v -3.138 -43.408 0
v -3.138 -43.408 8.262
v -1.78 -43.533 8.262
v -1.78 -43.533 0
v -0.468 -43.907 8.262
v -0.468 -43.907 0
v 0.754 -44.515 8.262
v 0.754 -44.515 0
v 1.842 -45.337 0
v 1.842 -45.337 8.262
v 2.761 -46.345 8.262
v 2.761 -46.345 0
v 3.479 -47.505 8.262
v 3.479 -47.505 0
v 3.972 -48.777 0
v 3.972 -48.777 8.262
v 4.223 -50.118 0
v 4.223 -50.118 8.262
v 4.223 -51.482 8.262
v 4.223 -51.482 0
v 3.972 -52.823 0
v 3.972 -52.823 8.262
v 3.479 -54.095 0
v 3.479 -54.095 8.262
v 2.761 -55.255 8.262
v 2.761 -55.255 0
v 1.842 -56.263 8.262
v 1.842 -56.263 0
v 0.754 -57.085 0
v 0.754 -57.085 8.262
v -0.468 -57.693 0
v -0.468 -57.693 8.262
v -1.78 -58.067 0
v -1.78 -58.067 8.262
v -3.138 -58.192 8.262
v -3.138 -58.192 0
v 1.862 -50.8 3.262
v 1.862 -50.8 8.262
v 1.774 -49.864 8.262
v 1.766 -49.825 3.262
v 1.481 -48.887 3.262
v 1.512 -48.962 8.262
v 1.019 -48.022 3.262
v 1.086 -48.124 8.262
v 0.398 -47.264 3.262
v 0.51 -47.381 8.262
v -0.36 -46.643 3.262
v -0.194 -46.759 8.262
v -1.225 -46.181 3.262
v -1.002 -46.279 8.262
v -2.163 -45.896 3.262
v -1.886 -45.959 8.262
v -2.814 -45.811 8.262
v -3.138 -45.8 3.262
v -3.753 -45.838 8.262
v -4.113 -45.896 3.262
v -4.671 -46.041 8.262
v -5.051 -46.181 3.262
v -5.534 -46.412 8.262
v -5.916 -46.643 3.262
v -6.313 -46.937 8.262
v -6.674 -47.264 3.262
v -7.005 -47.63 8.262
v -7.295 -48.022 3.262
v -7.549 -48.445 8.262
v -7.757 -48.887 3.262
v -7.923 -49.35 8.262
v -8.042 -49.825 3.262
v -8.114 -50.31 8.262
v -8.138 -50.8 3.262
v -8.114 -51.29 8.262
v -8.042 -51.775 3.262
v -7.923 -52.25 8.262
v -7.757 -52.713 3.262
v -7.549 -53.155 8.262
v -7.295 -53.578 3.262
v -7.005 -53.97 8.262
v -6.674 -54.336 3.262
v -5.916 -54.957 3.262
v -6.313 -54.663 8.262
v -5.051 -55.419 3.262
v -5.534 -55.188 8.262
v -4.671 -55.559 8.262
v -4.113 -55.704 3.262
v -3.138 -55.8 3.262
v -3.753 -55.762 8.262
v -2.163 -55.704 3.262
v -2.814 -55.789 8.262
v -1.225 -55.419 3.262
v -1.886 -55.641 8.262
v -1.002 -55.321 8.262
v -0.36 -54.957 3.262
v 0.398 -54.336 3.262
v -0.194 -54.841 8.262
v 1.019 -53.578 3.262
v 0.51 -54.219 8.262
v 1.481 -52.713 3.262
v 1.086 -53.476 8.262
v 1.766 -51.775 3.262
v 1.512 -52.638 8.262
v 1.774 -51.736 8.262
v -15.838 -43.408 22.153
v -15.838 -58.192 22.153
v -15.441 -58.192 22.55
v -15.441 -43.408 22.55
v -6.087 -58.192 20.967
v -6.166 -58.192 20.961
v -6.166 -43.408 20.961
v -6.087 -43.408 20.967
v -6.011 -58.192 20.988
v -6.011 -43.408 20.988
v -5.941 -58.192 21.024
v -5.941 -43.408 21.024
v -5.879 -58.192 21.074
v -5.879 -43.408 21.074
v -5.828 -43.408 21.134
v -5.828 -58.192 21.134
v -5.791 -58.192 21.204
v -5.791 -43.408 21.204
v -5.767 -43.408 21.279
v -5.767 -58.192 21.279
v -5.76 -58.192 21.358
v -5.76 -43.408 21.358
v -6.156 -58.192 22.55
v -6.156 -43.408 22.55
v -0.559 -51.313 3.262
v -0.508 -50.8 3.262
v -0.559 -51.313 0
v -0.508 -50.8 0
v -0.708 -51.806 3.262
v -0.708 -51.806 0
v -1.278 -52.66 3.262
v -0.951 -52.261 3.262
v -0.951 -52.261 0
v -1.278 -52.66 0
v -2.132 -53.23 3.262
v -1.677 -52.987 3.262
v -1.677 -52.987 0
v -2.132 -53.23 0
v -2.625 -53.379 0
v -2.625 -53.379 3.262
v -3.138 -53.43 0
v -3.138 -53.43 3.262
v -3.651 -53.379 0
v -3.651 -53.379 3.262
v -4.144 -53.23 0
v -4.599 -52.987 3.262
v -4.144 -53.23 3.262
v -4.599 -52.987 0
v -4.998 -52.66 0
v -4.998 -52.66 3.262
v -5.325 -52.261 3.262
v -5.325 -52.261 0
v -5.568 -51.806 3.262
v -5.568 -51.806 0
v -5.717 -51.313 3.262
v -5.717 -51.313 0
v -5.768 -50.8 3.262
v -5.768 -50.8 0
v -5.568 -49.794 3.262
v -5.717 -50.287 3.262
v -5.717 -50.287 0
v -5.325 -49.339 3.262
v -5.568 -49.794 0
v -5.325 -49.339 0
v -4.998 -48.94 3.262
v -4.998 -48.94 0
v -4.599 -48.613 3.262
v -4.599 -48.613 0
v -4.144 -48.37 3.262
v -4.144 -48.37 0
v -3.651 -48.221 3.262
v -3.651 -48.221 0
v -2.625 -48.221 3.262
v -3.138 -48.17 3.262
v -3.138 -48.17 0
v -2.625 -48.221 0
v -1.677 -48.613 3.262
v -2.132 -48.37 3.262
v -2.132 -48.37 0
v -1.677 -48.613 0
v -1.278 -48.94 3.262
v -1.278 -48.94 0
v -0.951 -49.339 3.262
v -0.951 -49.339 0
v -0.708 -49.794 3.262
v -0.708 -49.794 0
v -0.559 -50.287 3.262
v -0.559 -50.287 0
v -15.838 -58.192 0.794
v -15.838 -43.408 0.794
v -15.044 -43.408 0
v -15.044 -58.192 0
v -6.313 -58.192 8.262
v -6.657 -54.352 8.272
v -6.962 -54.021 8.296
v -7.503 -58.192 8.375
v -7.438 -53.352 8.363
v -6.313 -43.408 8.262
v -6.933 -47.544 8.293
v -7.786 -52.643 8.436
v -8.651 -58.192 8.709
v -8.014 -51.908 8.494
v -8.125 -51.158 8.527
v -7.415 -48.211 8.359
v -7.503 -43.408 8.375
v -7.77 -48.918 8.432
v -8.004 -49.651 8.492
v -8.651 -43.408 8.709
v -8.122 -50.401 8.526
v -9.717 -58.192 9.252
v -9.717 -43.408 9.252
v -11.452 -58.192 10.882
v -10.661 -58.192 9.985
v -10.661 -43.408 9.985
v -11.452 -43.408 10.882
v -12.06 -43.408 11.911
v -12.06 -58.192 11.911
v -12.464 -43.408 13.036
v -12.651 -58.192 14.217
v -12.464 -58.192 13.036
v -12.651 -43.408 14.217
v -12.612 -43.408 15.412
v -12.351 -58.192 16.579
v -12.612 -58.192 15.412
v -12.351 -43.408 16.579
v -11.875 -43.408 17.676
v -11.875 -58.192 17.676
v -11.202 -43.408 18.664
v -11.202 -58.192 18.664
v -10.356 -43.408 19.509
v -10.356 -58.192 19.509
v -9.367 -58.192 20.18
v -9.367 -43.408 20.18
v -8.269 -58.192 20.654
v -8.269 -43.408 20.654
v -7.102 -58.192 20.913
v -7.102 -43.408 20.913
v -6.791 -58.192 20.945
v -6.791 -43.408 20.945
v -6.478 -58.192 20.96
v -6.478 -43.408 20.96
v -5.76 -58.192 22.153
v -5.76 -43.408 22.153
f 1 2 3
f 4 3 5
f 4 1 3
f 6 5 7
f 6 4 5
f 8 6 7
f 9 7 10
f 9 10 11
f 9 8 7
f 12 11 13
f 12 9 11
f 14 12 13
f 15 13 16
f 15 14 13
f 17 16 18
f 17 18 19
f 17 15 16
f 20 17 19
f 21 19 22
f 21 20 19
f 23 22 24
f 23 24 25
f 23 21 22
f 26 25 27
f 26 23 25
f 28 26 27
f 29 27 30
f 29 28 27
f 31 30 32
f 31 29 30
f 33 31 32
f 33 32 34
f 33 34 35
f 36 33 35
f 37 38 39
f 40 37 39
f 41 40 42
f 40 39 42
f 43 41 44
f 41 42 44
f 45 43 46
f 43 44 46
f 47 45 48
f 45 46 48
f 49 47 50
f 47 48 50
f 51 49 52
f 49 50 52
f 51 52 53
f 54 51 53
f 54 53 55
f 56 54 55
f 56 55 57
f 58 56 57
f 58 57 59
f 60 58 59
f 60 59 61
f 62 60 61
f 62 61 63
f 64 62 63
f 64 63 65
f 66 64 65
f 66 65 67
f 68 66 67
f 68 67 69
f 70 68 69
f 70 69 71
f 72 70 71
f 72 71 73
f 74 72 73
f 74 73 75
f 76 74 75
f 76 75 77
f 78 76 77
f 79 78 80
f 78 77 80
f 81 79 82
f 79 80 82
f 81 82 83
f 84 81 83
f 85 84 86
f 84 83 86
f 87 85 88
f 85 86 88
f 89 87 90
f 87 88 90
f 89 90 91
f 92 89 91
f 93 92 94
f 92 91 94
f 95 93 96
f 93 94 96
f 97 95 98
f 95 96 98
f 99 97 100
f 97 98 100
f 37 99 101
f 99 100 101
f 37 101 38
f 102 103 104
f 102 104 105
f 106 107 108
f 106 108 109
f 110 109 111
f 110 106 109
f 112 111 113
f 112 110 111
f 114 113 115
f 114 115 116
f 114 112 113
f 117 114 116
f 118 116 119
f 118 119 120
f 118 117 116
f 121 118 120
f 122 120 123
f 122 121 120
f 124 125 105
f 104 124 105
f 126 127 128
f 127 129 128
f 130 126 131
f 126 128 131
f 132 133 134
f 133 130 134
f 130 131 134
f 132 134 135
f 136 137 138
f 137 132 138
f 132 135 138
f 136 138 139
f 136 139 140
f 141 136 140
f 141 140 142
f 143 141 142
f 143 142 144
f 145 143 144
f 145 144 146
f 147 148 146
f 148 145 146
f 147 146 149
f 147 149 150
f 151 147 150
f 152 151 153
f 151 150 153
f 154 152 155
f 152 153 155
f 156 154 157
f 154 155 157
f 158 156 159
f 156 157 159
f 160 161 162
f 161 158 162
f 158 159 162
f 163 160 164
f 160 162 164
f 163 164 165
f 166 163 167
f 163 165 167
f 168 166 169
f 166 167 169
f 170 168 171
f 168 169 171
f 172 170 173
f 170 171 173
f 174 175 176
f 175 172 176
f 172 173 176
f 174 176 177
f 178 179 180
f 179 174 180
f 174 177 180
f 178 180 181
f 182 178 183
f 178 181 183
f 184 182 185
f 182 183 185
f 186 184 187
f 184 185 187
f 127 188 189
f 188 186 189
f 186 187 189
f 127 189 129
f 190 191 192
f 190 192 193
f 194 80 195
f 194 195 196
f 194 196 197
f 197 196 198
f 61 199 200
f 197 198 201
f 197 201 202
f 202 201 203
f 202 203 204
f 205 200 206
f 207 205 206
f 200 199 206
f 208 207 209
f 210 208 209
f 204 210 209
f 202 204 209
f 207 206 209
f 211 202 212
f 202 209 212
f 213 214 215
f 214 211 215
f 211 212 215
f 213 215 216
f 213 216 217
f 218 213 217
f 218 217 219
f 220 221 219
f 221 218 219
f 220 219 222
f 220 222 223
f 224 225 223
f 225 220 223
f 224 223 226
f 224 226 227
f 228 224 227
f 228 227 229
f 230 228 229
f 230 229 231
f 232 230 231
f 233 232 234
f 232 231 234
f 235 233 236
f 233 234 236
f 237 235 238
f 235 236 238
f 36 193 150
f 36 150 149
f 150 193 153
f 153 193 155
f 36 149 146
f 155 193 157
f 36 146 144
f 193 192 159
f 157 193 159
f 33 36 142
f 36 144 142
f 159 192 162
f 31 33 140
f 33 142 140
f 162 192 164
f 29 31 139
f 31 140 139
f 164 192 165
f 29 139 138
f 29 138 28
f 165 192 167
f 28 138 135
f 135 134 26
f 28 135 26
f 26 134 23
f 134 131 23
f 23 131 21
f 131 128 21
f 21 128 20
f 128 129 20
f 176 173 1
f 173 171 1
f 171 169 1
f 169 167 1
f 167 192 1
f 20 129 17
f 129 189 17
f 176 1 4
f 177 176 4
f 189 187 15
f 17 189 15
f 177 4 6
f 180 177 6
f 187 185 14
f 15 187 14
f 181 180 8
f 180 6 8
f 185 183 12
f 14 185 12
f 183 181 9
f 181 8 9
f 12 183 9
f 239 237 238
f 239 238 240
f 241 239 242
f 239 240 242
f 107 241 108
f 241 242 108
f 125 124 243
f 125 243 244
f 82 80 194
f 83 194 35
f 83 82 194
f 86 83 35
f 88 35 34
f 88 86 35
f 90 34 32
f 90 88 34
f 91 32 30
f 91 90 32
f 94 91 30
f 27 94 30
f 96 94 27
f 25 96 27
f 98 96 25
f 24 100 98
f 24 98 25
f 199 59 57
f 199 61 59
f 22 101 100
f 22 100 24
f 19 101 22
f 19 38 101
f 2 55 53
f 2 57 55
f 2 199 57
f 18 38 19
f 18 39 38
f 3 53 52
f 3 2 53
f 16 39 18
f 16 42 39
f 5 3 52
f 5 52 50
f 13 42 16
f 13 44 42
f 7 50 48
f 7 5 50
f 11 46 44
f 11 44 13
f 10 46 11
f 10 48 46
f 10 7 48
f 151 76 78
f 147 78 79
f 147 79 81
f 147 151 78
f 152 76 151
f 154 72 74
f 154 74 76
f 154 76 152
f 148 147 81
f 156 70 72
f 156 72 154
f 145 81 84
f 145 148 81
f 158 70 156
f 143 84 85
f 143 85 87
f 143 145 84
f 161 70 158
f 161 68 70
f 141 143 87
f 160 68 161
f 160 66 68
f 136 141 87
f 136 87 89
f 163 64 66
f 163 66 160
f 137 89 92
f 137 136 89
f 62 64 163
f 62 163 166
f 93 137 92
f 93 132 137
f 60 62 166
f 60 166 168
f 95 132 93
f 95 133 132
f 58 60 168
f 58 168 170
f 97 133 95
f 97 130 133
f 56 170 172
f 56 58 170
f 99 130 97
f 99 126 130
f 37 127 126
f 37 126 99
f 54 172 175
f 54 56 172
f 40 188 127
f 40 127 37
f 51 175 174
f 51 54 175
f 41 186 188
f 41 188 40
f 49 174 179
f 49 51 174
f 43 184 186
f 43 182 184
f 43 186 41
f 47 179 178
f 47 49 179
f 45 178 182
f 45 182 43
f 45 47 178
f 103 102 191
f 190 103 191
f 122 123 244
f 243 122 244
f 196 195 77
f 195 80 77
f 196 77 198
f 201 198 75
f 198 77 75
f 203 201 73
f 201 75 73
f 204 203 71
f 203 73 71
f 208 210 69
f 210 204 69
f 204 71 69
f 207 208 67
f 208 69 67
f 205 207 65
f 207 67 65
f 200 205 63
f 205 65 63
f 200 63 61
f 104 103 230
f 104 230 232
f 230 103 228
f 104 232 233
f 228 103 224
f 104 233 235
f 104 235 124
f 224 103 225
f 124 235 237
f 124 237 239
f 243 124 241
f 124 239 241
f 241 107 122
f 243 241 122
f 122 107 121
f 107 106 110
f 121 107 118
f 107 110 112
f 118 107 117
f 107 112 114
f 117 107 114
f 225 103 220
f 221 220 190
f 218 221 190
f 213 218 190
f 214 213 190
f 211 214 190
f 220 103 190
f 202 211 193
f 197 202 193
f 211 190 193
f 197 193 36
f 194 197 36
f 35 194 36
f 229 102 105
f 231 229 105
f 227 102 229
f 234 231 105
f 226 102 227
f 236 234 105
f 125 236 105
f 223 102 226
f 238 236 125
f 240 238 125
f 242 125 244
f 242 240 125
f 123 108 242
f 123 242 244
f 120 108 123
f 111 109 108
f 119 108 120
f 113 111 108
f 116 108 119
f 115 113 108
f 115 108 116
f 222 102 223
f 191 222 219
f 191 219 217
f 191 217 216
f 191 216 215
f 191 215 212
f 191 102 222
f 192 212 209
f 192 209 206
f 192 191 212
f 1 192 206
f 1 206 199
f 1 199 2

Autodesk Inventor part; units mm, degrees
ref_plane "YZ Plane" through (0, 0, 0) normal (1, 0, 0) x (0, 1, 0)
ref_plane "XZ Plane" through (0, 0, 0) normal (0, 1, 0) x (-1, 0, 0)
ref_plane "Work Plane1" through (0, 0, 0) normal (0, 0, 1) x (1, 0, 0)
sketch "Sketch1" plane through (0, 0, 0) normal (0, 0, 1) x (1, 0, 0)
  line L0 (-0.508, 0) -> (-0.508, -400) projected
  line L1 (-5.768, 0) -> (-5.768, -400) projected
  circle A0 centre (-3.138, -50.8) radius 2.63
  line L2 (-13.138, 0) -> (-13.138, -400) projected
  circle A1 centre (-3.138, -50.8) radius 7.3925 construction
  line L3 (-3.138, -58.1925) -> (-15.838, -58.1925)
  line L4 (-15.838, -58.1925) -> (-15.838, -43.4075)
  line L5 (-15.838, -43.4075) -> (-3.138, -43.4075)
  arc A2 (-3.138, -58.1925) -> (-3.138, -43.4075) centre (-3.138, -50.8) ccw
  point P0 (0, 0)
  dimension "d0" = 5.26
  dimension "d1" = 10
  dimension "d2" = 4.7625
  dimension "d3" = 12.7
  dimension "d4" = 50.8
extrude "Extrusion1" add sketch "Sketch1" along normal blind 8.2625 contours A2 L0 | L0 A0 L1 L5 A2 | L0 A2 L3 L1 A0 | L1 L3 L2 L5 | L2 L3 L4 L5
sketch "Sketch2" plane through (0, 0, 8.2625) normal (0, 0, 1) x (1, 0, 0)
  line L0 (-15.838, -43.4075) -> (-15.838, -58.1925) projected
  line L1 (-15.838, -58.1925) -> (-3.138, -58.1925) projected
  arc A0 (-3.138, -58.1925) -> (-3.138, -43.4075) centre (-3.138, -50.8) ccw projected
  line L2 (-3.138, -43.4075) -> (-15.838, -43.4075) projected
  circle A1 centre (-3.138, -50.8) radius 2.63 projected
  line L3 (-3.138, -43.4075) -> (-15.838, -43.4075) projected
  line L4 (-12.663, -43.4075) -> (-12.663, -58.1925)
  point P0 (0, 0)
  dimension "d7" = 3.175
extrude "Extrusion2" add sketch "Sketch2" along normal blind 12.7 contours L2 L4 L1 L0
sketch "Sketch3" plane through (-15.838, -43.4075, 0) normal (0, 1, 0) x (1, 0, 0)
  circle A0 centre (9.525, -14.6125) radius 6.35 construction
  line L0 (12.7, -8.2625) -> (3.175, -8.2625) projected
  line L1 (3.175, -8.2625) -> (3.175, -20.9625) projected
  line L2 (3.175, -20.9625) -> (9.525, -20.9625)
  arc A1 (9.525, -8.2625) -> (9.525, -20.9625) centre (9.525, -14.6125) ccw
  point P0 (15.838, 0)
  point P1 (3.175, -14.6125)
  dimension "d10" = 12.7
extrude "Extrusion3" add sketch "Sketch3" against normal up to surface (14.785 mm away)
fillet "Fillet1" radius 0.0247 1 edges at (-6.313, -50.8, 20.9625)
chamfer "Chamfer1" distance 0.7937 angle 45 2 edges at (-15.838, -50.8, 0) (-15.838, -50.8, 20.9625)
sketch "Sketch4" plane through (-3.138, -43.4075, 8.2625) normal (0, 1, 0) x (1, 0, 0)
  arc A0 (-3.175, 0) -> (-3.9641, -12.6508) centre (-3.175, -6.35) ccw projected
  arc A1 (-3.9641, -12.6508) -> (-2.6216, -12.6758) centre (-3.175, -6.35) ccw
  arc A2 (-3.9672, -12.7) -> (-3.9641, -12.6508) centre (-3.9672, -12.6753) ccw projected
  line L0 (-3.175, -6.35) -> (-2.6216, -12.6758) construction
  line L1 (-3.175, -6.35) -> (-3.175, -12.7) construction
  line L2 (-2.6216, -12.6758) -> (-2.6216, -14.2875)
  line L3 (-2.6216, -14.2875) -> (-12.7, -14.2875)
  line L4 (-11.9062, -12.7) -> (-12.7, -11.9062) projected
  line L5 (-12.7, -14.2875) -> (-12.7, -11.9062)
  line L6 (-11.9062, -12.7) -> (-3.9672, -12.7) projected
  point P0 (3.138, 8.2625)
  point P1 (-3.9425, -12.6768)
  dimension "d18" = 5
  dimension "d19" = 1.5875
extrude "Extrusion4" add sketch "Sketch4" against normal up to surface (14.785 mm away)
fillet "Fillet2" radius 0.3969 1 edges at (-5.7596, -50.8, 20.9383)
chamfer "Chamfer2" distance 0.3969 angle 45 2 edges at (-5.7596, -50.8, 22.55) (-15.838, -50.8, 22.55)
sketch "Sketch5" plane through (0, 0, 8.2625) normal (0, 0, 1) x (1, 0, 0)
  circle A0 centre (-3.138, -50.8) radius 2.63 projected
  circle A1 centre (-3.138, -50.8) radius 5
  point P0 (0, 0)
  dimension "d26" = 10
extrude "Extrusion5" cut sketch "Sketch5" along normal mid plane 10
properties part number "CNC-029-WireConduitHolder"
